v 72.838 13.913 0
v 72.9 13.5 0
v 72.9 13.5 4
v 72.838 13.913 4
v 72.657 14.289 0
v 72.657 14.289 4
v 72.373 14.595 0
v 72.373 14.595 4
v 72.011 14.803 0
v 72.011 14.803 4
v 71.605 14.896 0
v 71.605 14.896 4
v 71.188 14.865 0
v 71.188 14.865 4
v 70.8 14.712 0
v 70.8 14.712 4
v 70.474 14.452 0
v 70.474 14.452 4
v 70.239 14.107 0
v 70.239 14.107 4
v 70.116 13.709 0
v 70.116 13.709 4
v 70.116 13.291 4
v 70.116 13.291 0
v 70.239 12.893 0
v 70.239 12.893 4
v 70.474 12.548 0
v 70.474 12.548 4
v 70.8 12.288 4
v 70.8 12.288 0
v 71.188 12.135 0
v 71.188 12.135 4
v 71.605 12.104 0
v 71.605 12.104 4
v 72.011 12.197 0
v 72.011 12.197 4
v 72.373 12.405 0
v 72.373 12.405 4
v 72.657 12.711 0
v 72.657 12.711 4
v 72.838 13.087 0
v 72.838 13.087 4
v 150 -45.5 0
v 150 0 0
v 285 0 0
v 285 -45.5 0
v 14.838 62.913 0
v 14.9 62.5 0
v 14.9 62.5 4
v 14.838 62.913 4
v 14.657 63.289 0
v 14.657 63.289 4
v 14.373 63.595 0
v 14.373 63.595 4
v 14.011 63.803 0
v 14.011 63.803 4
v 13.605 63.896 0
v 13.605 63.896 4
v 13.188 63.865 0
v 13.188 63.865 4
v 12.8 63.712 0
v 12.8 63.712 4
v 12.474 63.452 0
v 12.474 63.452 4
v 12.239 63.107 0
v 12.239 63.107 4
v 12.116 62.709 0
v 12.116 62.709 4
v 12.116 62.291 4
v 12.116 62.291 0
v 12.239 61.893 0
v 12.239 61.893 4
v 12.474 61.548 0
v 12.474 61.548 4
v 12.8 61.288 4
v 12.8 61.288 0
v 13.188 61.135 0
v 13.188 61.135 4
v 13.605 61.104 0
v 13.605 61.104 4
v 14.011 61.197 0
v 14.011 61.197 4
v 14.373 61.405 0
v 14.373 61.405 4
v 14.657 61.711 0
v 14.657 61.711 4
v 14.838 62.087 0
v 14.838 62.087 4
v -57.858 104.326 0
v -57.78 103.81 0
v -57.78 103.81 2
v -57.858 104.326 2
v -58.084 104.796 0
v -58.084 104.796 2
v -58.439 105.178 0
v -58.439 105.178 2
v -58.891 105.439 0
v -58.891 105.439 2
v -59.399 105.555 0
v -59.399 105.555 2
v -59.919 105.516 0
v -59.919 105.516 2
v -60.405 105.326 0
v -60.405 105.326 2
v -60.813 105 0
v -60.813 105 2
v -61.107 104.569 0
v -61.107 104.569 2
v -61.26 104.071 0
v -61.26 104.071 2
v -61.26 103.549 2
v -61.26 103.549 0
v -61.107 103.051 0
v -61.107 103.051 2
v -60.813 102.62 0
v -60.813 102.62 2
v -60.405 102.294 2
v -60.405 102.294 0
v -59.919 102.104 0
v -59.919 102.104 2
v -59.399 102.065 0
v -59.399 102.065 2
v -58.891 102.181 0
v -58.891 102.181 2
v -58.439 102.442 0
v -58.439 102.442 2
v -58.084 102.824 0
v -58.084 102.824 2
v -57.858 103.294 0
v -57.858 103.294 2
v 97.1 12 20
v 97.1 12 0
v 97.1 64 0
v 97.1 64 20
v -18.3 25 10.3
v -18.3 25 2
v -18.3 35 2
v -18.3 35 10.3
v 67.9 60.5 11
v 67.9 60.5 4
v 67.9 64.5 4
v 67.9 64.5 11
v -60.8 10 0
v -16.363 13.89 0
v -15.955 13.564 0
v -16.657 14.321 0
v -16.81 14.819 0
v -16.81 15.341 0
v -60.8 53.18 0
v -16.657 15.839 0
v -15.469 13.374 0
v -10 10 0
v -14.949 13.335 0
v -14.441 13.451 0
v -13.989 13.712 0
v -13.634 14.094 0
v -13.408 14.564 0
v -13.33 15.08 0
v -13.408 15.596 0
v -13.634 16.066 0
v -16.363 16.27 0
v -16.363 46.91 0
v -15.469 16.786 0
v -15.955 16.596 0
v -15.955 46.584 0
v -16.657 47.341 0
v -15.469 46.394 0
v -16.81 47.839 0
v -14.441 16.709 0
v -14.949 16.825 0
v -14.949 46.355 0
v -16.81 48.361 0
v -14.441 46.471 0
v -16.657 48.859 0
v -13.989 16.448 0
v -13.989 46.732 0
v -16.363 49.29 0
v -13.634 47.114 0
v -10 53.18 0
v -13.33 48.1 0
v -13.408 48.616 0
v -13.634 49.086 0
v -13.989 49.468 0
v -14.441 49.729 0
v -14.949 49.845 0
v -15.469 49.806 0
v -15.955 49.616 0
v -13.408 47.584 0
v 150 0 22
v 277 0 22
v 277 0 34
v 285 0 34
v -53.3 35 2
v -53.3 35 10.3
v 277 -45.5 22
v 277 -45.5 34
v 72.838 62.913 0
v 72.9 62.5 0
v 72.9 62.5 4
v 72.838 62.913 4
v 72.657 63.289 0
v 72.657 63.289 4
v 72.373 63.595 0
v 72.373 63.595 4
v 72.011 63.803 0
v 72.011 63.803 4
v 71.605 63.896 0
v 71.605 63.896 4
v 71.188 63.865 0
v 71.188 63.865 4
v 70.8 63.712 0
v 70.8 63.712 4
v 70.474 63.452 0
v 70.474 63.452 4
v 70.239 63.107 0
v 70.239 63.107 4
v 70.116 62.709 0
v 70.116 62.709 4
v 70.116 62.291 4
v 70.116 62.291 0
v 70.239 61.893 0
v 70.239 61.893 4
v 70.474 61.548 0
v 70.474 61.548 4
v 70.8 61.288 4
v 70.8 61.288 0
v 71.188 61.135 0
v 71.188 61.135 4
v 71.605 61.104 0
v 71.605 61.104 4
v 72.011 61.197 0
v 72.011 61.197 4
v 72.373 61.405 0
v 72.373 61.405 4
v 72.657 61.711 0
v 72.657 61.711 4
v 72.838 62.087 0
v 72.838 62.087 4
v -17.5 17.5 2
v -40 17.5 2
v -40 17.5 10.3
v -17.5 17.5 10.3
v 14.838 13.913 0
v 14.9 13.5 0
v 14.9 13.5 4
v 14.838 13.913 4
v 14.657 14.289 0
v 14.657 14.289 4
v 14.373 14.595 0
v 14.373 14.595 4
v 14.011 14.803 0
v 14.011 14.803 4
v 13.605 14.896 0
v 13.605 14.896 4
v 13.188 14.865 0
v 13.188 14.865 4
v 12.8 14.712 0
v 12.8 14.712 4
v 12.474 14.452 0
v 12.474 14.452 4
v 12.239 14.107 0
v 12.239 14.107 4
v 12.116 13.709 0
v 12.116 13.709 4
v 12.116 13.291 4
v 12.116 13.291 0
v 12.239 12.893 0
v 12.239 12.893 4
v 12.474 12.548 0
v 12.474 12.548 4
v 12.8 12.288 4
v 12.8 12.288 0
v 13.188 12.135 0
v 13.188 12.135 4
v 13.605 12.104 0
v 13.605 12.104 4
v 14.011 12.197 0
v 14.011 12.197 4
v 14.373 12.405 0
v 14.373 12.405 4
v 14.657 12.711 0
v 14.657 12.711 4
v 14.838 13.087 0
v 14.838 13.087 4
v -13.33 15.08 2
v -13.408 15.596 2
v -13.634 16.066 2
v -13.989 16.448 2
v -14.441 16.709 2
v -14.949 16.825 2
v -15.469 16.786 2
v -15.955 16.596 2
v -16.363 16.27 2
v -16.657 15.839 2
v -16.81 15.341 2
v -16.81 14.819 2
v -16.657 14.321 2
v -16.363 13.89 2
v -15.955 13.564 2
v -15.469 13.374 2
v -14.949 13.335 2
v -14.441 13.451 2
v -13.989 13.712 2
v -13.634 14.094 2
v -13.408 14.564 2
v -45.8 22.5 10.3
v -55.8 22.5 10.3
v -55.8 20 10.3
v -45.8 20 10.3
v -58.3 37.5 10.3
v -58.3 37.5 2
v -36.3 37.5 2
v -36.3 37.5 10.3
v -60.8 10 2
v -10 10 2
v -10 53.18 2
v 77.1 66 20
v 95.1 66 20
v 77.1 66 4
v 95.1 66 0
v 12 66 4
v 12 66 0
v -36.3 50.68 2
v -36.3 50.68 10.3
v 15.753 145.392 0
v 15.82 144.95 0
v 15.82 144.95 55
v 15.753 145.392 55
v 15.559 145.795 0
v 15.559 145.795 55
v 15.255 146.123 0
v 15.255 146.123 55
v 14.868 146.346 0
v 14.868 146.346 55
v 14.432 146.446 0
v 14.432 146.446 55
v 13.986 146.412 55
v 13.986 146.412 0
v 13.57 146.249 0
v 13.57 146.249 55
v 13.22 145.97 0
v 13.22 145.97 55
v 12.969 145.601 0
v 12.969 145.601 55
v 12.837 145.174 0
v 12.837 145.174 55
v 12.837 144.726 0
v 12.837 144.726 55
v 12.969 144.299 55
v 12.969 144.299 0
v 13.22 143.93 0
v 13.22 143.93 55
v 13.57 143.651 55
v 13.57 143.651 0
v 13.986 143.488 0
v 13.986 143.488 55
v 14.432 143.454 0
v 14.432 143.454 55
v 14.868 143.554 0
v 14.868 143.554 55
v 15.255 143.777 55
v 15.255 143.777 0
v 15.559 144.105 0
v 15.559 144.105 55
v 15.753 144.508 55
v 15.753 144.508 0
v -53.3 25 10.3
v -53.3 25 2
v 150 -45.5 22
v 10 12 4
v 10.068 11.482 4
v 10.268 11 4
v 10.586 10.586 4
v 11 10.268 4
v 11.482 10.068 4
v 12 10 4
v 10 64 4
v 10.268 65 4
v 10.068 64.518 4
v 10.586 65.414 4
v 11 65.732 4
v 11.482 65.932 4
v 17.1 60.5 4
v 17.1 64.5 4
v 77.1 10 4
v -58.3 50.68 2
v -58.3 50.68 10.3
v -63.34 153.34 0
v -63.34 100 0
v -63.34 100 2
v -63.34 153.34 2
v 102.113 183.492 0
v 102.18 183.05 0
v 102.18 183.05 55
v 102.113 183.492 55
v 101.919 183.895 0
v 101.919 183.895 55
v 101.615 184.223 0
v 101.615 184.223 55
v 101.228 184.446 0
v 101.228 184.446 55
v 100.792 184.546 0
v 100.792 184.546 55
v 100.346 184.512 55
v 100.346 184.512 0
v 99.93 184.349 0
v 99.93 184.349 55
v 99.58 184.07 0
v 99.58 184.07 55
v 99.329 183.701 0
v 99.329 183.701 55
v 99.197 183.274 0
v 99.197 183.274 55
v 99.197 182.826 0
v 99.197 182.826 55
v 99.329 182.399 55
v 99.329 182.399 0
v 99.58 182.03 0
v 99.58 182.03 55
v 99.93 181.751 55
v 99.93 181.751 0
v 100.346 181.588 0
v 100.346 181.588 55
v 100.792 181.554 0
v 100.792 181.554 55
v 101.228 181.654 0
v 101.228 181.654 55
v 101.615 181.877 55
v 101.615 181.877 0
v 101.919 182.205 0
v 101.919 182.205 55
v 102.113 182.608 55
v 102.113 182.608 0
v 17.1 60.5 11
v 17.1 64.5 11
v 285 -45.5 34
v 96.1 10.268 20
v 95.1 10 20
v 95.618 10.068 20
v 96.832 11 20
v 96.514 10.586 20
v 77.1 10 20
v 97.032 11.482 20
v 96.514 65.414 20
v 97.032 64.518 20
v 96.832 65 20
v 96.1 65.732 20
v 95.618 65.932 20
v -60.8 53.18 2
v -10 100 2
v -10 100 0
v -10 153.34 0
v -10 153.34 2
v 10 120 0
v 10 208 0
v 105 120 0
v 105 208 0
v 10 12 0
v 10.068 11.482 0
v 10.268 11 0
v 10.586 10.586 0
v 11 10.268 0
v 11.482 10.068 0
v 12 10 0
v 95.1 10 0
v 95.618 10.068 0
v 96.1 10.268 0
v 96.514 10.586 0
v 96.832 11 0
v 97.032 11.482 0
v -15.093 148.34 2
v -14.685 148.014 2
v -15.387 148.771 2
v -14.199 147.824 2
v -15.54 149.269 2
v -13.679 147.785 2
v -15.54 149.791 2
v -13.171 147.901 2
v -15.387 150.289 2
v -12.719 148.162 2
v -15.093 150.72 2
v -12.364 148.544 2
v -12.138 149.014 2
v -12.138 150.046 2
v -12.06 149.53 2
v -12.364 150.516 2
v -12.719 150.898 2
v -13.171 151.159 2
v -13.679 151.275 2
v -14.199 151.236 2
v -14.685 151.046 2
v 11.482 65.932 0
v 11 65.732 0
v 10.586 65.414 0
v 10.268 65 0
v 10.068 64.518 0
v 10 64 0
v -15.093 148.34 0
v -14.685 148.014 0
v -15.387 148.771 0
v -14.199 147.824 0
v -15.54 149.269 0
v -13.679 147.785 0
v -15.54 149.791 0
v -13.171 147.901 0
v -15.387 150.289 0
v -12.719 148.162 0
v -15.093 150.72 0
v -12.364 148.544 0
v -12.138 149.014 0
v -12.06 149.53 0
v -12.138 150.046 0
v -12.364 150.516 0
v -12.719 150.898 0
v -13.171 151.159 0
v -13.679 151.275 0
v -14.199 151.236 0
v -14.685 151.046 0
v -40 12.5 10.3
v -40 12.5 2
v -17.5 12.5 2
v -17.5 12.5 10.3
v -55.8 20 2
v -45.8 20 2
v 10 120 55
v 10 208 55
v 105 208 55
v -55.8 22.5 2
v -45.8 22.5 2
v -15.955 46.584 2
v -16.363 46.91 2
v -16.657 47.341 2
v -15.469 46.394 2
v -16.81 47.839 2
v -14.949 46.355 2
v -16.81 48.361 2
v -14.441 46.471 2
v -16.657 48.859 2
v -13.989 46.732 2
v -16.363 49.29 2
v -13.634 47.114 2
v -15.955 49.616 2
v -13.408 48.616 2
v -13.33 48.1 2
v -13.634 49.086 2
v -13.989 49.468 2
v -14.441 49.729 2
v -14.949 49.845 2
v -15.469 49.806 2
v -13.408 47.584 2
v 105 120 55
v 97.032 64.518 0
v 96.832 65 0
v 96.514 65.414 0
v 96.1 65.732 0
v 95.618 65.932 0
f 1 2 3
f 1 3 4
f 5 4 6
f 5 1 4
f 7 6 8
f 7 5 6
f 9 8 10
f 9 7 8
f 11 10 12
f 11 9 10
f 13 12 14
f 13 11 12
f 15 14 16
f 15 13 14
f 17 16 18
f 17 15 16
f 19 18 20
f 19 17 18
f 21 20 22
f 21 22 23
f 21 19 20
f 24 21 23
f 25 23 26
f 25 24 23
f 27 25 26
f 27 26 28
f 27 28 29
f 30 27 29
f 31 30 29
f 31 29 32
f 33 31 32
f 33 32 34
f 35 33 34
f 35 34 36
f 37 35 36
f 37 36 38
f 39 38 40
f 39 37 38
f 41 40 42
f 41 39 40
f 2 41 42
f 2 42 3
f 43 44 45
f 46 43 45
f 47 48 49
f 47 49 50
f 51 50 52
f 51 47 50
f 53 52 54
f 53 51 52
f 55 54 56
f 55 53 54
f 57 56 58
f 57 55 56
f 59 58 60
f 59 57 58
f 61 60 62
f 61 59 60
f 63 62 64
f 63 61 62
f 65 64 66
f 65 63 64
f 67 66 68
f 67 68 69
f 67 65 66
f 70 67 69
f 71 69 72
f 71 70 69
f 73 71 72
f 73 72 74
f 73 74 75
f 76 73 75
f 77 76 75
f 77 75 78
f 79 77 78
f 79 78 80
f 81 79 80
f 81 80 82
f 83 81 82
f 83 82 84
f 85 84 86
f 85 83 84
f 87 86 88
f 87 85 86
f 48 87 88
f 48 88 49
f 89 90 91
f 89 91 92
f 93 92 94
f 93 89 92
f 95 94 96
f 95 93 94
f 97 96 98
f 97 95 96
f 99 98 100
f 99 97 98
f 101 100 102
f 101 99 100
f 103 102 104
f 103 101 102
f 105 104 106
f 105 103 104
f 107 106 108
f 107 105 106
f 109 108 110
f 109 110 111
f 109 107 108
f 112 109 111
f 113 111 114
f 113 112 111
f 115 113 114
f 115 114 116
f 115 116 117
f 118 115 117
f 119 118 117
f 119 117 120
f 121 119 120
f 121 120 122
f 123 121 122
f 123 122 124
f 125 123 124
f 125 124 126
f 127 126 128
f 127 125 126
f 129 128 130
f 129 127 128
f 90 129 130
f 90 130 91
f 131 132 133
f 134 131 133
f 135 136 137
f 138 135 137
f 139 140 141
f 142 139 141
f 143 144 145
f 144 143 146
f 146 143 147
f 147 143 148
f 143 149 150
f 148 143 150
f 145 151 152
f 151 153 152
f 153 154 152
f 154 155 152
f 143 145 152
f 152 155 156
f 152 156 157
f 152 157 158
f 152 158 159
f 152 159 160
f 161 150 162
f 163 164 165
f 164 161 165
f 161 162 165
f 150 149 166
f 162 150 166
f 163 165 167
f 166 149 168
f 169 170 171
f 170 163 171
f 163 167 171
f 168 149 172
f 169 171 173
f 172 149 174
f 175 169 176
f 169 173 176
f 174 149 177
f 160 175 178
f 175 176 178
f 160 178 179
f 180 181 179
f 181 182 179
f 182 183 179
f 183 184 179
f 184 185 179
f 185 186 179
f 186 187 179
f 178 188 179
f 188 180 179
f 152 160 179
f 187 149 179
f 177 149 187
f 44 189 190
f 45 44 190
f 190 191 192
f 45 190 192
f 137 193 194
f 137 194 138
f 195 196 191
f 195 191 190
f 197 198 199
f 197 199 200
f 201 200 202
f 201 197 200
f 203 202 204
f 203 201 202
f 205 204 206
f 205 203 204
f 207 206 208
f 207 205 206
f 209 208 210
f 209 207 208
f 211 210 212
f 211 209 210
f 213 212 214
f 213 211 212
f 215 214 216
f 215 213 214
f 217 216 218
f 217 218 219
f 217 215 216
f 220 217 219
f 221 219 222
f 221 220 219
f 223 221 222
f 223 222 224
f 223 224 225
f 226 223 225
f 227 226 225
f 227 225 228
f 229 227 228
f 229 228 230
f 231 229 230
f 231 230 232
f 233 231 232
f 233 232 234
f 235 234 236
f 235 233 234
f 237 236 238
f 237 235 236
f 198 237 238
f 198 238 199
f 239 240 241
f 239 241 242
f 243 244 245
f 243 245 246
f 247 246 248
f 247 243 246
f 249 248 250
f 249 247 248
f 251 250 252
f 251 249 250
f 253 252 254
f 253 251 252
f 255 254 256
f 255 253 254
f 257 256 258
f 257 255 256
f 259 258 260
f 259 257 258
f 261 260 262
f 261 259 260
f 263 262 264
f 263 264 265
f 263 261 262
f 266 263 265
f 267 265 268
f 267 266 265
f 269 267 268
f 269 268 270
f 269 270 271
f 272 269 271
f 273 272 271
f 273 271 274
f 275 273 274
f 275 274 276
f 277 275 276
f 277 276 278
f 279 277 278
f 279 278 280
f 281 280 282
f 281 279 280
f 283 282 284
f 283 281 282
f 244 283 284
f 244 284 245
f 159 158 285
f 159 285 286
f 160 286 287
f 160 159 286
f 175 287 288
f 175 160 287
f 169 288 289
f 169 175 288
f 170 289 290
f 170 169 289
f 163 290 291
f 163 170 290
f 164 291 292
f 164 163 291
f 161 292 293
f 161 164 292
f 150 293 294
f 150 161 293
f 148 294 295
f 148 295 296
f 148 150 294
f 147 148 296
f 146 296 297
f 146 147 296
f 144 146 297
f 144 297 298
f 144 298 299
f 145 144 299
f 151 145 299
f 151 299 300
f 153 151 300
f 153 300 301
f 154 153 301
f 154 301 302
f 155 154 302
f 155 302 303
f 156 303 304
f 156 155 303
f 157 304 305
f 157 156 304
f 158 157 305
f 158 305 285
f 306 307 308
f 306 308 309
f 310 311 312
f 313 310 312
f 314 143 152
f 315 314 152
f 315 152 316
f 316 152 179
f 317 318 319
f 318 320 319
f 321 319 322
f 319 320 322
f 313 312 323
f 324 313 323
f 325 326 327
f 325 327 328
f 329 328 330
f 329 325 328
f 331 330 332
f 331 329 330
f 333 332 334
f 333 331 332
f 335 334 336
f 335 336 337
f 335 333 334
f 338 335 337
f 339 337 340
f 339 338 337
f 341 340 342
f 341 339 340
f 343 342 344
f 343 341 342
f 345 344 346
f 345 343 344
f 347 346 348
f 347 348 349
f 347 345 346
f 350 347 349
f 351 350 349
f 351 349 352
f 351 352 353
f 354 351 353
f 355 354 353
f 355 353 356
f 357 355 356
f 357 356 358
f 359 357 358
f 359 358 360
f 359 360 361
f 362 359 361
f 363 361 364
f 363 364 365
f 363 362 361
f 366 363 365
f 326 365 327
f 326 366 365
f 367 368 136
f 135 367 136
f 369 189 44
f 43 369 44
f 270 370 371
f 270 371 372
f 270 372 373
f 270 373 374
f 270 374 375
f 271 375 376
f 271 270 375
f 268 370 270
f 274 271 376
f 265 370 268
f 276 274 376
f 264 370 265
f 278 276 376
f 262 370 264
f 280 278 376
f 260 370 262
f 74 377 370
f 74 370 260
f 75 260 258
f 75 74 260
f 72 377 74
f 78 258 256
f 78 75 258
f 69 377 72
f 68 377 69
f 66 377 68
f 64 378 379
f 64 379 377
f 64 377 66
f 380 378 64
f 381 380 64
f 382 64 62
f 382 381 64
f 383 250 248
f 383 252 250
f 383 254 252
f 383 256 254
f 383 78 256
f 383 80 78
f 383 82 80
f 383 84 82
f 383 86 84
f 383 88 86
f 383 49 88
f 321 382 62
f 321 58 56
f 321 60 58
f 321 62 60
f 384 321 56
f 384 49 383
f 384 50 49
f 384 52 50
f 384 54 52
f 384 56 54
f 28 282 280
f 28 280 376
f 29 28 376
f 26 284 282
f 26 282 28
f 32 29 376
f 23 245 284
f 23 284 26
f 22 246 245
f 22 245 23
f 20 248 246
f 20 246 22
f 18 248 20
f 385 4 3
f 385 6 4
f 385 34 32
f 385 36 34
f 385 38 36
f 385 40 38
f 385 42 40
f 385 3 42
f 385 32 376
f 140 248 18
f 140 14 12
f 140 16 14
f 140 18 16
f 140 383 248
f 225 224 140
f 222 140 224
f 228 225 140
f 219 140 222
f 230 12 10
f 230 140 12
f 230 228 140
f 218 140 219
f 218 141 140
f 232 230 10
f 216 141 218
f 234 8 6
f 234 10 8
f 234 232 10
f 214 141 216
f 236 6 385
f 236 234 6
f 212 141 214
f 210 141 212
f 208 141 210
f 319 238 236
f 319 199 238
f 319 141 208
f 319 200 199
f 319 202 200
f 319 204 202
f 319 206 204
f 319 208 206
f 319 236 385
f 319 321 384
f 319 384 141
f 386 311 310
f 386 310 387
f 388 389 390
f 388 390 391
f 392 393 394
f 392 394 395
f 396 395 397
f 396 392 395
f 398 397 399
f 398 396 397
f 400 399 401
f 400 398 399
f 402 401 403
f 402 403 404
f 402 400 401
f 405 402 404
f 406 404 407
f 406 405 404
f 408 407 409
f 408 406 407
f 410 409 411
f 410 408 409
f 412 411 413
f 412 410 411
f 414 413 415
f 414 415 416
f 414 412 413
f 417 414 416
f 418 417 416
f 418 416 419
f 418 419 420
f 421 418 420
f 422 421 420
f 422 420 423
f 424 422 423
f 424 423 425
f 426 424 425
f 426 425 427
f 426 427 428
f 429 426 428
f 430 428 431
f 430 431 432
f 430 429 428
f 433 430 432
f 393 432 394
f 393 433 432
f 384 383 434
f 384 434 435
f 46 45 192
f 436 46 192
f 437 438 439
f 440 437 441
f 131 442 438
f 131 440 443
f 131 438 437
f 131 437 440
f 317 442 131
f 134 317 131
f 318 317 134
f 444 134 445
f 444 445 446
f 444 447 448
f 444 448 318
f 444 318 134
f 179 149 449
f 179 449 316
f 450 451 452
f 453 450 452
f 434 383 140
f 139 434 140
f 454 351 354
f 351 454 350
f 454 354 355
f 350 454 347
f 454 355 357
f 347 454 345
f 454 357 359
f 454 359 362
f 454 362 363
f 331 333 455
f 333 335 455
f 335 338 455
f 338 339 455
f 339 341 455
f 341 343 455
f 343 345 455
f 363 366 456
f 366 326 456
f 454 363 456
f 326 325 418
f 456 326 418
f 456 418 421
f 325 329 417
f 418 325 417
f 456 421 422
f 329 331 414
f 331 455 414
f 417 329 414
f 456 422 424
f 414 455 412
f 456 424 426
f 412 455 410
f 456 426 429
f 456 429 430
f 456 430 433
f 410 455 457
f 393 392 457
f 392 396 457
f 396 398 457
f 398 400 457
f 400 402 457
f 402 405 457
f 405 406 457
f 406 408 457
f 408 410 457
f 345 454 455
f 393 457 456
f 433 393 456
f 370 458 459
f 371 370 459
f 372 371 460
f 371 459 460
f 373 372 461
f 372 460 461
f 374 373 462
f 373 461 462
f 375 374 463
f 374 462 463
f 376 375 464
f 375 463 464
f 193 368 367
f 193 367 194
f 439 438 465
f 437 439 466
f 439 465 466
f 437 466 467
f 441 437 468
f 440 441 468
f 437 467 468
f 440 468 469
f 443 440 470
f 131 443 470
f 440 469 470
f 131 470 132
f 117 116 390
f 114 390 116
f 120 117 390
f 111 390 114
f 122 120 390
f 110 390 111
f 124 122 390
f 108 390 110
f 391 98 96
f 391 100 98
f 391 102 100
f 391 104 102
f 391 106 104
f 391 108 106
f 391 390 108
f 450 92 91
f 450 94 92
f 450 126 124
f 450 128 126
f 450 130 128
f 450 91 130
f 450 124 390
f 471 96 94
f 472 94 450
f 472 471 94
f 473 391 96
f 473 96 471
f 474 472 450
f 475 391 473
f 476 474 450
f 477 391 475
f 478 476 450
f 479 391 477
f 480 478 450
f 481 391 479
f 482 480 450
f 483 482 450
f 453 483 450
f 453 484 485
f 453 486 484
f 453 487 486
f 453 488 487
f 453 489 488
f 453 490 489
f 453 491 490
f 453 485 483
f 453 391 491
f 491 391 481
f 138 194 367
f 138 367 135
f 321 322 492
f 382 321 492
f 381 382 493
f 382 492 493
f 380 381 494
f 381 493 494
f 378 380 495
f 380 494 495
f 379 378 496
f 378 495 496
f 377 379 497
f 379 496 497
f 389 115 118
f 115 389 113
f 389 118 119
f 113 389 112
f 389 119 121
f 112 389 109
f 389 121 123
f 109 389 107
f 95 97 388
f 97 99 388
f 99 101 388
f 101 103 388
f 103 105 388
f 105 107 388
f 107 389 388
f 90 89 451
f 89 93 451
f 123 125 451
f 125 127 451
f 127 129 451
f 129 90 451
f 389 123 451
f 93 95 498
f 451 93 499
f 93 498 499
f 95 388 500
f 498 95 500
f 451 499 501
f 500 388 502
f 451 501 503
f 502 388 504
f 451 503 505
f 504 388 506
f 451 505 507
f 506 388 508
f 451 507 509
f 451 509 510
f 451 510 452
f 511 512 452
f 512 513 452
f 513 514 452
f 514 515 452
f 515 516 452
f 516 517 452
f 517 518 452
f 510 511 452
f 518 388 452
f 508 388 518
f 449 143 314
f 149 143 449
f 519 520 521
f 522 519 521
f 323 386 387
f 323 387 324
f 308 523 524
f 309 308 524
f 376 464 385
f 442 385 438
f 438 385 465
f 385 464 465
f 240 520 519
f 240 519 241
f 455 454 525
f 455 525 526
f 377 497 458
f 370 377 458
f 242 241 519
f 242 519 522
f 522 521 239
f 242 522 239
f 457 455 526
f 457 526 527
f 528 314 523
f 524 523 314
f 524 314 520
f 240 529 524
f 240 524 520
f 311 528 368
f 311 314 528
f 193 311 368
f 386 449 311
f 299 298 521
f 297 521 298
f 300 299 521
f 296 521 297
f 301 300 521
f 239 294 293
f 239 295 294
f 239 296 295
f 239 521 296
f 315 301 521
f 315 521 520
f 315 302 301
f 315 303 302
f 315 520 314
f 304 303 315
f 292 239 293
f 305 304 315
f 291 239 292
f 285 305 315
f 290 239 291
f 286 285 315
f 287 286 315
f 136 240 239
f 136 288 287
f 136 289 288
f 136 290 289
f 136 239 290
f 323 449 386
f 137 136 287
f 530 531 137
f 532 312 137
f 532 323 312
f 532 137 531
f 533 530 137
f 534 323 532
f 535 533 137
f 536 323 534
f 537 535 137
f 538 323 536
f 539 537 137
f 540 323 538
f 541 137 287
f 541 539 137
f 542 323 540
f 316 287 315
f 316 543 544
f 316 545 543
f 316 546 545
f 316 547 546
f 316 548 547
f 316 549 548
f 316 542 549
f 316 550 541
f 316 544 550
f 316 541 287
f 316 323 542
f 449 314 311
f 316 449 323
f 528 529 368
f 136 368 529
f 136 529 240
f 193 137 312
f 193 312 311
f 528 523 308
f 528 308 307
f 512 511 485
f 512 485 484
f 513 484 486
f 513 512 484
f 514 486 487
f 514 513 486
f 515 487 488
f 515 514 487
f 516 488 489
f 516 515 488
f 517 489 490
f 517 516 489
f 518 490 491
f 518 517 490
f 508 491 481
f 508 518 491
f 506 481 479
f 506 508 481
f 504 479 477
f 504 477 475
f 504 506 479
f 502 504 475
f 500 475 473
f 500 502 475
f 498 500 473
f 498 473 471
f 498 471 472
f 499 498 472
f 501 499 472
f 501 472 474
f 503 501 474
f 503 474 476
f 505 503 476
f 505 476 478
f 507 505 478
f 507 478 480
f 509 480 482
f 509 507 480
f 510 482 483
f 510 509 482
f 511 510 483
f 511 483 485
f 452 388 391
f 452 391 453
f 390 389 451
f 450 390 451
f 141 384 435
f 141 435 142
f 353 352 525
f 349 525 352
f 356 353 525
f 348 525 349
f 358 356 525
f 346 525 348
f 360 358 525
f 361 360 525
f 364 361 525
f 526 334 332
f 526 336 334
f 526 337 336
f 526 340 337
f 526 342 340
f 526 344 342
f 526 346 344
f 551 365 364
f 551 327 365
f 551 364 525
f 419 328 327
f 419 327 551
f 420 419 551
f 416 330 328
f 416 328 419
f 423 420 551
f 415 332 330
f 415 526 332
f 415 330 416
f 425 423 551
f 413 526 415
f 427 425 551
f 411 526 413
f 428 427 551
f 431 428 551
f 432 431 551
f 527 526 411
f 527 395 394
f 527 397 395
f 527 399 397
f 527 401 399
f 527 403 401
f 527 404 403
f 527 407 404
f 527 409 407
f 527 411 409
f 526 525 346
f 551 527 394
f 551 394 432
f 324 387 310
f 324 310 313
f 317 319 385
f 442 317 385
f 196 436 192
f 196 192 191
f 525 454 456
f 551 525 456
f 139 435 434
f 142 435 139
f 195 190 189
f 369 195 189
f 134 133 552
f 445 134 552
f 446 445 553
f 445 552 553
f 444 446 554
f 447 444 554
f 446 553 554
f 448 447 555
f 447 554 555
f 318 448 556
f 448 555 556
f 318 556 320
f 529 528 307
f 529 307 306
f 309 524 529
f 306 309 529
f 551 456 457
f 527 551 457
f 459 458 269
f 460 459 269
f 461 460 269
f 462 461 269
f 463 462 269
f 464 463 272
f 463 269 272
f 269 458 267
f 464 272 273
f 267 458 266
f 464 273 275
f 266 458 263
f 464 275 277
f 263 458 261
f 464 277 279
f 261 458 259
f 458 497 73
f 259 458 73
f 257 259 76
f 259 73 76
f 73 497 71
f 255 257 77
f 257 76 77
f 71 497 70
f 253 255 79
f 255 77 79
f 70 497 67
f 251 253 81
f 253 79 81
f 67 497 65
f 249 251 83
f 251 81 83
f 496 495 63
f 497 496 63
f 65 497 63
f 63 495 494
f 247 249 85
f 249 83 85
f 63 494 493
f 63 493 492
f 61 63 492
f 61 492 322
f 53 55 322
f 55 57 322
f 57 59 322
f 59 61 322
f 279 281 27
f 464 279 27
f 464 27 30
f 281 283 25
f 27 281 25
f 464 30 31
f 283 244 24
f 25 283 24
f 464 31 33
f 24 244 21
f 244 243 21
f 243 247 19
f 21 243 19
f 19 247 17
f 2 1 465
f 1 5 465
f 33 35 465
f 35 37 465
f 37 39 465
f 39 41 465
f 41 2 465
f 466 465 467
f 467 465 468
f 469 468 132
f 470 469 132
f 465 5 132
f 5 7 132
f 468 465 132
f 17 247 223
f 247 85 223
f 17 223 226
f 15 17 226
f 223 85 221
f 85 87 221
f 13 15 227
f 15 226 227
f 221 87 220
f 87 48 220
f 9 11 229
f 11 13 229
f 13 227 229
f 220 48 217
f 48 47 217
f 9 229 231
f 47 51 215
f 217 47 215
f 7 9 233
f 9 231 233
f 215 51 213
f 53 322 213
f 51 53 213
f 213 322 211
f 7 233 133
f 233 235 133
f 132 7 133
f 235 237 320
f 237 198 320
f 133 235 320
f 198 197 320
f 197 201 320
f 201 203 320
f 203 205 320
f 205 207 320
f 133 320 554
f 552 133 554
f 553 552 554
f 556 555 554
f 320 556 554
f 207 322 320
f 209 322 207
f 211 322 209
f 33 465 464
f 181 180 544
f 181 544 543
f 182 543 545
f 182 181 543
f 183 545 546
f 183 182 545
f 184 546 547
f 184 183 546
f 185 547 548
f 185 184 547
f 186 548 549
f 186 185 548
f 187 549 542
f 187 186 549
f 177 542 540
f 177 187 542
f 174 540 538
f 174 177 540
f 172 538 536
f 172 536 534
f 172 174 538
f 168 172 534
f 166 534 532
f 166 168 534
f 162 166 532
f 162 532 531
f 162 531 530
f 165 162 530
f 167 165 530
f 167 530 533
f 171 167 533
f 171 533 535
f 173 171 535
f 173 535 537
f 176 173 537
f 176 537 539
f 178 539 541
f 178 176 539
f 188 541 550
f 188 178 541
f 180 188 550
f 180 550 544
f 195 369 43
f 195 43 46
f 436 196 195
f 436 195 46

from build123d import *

# Parameters (mm, degrees)
F0_R      = 1.4
F1_DEPTH  = 4
F2_W      = 50.8
F2_H      = 4
F3_DEPTH  = 7
F5_DEPTH  = 16
F6_W      = 95
F6_H      = 88
F6_R      = 1.5
F7_DEPTH  = 55
F8_W      = 50.8
F8_H      = 43.18
F8_R      = 1.75
F8_W_2    = 53.34
F8_H_2    = 53.34
F9_DEPTH  = 2
F10_W     = 35
F10_H     = 10
F10_W_2   = 22.5
F10_H_2   = 5
F10_W_3   = 10
F10_H_3   = 2.5
F10_W_4   = 22
F10_H_4   = 13.18
F11_DEPTH = 8.3
F13_DEPTH = 45.5


with BuildPart() as f1:
    # F0 (on Top) → F1 (new body)
    with BuildSketch(Plane.XY):
        with BuildLine():
            Line((95.1, 66), (12, 66))
            ThreePointArc((12, 66), (10.585786, 65.414214), (10, 64))
            Line((10, 64), (10, 12))
            ThreePointArc((10, 12), (10.585786, 10.585786), (12, 10))
            Line((12, 10), (95.1, 10))
            ThreePointArc((95.1, 10), (96.514214, 10.585786), (97.1, 12))
            Line((97.1, 12), (97.1, 64))
            ThreePointArc((97.1, 64), (96.514214, 65.414214), (95.1, 66))
        make_face()
        with Locations((13.5, 13.5)):
            Circle(F0_R, mode=Mode.SUBTRACT)
        with Locations((71.5, 13.5)):
            Circle(F0_R, mode=Mode.SUBTRACT)
        with Locations((13.5, 62.5)):
            Circle(F0_R, mode=Mode.SUBTRACT)
        with Locations((71.5, 62.5)):
            Circle(F0_R, mode=Mode.SUBTRACT)
    extrude(amount=F1_DEPTH)

    # F2 (on face) → F3 (join)
    with BuildSketch(Plane.XY.offset(4)):
        with Locations((42.5, 62.5)):
            Rectangle(F2_W, F2_H)
    extrude(amount=F3_DEPTH)

    # F4 (on face) → F5 (join)
    with BuildSketch(Plane.XY.offset(4)):
        with BuildLine():
            ThreePointArc((97.1, 64), (96.514214, 65.414214), (95.1, 66))
            Line((95.1, 66), (77.1, 66))
            Line((77.1, 66), (77.1, 10))
            Line((77.1, 10), (95.1, 10))
            ThreePointArc((95.1, 10), (96.514214, 10.585786), (97.1, 12))
            Line((97.1, 12), (97.1, 64))
        make_face()
    extrude(amount=F5_DEPTH)


with BuildPart() as f7:
    # F6 (on Top) → F7 (new body)
    with BuildSketch(Plane.XY):
        with Locations((57.5, 164)):
            Rectangle(F6_W, F6_H)
        with Locations((14.32, 144.95)):
            Circle(F6_R, mode=Mode.SUBTRACT)
        with Locations((100.68, 183.05)):
            Circle(F6_R, mode=Mode.SUBTRACT)
    extrude(amount=F7_DEPTH)


with BuildPart() as f9:
    # F8 (on Top) → F9 (new body)
    with BuildSketch(Plane.XY):
        with Locations((-35.4, 31.59)):
            Rectangle(F8_W, F8_H)
        with Locations((-15.08, 15.08)):
            Circle(F8_R, mode=Mode.SUBTRACT)
        with Locations((-15.08, 48.1)):
            Circle(F8_R, mode=Mode.SUBTRACT)
        with Locations((-36.67, 126.67)):
            Rectangle(F8_W_2, F8_H_2)
        with Locations((-59.53, 103.81)):
            Circle(F8_R, mode=Mode.SUBTRACT)
        with Locations((-13.81, 149.53)):
            Circle(F8_R, mode=Mode.SUBTRACT)
    extrude(amount=F9_DEPTH)

    # F10 (on face) → F11 (join)
    with BuildSketch(Plane.XY.offset(2)):
        with Locations((-35.8, 30)):
            Rectangle(F10_W, F10_H)
        with Locations((-28.75, 15)):
            Rectangle(F10_W_2, F10_H_2)
        with Locations((-50.8, 21.25)):
            Rectangle(F10_W_3, F10_H_3)
        with Locations((-47.3, 44.09)):
            Rectangle(F10_W_4, F10_H_4)
    extrude(amount=F11_DEPTH)


with BuildPart() as f13:
    # F12 (on Front) → F13 (new body)
    with BuildSketch(Plane.XZ):
        Polygon((150, 22), (150, 0), (285, 0), (285, 22), (285, 34), (277, 34), (277, 22), align=None)
    extrude(amount=F13_DEPTH)


solid = Compound([f1.part, f7.part, f9.part, f13.part])
